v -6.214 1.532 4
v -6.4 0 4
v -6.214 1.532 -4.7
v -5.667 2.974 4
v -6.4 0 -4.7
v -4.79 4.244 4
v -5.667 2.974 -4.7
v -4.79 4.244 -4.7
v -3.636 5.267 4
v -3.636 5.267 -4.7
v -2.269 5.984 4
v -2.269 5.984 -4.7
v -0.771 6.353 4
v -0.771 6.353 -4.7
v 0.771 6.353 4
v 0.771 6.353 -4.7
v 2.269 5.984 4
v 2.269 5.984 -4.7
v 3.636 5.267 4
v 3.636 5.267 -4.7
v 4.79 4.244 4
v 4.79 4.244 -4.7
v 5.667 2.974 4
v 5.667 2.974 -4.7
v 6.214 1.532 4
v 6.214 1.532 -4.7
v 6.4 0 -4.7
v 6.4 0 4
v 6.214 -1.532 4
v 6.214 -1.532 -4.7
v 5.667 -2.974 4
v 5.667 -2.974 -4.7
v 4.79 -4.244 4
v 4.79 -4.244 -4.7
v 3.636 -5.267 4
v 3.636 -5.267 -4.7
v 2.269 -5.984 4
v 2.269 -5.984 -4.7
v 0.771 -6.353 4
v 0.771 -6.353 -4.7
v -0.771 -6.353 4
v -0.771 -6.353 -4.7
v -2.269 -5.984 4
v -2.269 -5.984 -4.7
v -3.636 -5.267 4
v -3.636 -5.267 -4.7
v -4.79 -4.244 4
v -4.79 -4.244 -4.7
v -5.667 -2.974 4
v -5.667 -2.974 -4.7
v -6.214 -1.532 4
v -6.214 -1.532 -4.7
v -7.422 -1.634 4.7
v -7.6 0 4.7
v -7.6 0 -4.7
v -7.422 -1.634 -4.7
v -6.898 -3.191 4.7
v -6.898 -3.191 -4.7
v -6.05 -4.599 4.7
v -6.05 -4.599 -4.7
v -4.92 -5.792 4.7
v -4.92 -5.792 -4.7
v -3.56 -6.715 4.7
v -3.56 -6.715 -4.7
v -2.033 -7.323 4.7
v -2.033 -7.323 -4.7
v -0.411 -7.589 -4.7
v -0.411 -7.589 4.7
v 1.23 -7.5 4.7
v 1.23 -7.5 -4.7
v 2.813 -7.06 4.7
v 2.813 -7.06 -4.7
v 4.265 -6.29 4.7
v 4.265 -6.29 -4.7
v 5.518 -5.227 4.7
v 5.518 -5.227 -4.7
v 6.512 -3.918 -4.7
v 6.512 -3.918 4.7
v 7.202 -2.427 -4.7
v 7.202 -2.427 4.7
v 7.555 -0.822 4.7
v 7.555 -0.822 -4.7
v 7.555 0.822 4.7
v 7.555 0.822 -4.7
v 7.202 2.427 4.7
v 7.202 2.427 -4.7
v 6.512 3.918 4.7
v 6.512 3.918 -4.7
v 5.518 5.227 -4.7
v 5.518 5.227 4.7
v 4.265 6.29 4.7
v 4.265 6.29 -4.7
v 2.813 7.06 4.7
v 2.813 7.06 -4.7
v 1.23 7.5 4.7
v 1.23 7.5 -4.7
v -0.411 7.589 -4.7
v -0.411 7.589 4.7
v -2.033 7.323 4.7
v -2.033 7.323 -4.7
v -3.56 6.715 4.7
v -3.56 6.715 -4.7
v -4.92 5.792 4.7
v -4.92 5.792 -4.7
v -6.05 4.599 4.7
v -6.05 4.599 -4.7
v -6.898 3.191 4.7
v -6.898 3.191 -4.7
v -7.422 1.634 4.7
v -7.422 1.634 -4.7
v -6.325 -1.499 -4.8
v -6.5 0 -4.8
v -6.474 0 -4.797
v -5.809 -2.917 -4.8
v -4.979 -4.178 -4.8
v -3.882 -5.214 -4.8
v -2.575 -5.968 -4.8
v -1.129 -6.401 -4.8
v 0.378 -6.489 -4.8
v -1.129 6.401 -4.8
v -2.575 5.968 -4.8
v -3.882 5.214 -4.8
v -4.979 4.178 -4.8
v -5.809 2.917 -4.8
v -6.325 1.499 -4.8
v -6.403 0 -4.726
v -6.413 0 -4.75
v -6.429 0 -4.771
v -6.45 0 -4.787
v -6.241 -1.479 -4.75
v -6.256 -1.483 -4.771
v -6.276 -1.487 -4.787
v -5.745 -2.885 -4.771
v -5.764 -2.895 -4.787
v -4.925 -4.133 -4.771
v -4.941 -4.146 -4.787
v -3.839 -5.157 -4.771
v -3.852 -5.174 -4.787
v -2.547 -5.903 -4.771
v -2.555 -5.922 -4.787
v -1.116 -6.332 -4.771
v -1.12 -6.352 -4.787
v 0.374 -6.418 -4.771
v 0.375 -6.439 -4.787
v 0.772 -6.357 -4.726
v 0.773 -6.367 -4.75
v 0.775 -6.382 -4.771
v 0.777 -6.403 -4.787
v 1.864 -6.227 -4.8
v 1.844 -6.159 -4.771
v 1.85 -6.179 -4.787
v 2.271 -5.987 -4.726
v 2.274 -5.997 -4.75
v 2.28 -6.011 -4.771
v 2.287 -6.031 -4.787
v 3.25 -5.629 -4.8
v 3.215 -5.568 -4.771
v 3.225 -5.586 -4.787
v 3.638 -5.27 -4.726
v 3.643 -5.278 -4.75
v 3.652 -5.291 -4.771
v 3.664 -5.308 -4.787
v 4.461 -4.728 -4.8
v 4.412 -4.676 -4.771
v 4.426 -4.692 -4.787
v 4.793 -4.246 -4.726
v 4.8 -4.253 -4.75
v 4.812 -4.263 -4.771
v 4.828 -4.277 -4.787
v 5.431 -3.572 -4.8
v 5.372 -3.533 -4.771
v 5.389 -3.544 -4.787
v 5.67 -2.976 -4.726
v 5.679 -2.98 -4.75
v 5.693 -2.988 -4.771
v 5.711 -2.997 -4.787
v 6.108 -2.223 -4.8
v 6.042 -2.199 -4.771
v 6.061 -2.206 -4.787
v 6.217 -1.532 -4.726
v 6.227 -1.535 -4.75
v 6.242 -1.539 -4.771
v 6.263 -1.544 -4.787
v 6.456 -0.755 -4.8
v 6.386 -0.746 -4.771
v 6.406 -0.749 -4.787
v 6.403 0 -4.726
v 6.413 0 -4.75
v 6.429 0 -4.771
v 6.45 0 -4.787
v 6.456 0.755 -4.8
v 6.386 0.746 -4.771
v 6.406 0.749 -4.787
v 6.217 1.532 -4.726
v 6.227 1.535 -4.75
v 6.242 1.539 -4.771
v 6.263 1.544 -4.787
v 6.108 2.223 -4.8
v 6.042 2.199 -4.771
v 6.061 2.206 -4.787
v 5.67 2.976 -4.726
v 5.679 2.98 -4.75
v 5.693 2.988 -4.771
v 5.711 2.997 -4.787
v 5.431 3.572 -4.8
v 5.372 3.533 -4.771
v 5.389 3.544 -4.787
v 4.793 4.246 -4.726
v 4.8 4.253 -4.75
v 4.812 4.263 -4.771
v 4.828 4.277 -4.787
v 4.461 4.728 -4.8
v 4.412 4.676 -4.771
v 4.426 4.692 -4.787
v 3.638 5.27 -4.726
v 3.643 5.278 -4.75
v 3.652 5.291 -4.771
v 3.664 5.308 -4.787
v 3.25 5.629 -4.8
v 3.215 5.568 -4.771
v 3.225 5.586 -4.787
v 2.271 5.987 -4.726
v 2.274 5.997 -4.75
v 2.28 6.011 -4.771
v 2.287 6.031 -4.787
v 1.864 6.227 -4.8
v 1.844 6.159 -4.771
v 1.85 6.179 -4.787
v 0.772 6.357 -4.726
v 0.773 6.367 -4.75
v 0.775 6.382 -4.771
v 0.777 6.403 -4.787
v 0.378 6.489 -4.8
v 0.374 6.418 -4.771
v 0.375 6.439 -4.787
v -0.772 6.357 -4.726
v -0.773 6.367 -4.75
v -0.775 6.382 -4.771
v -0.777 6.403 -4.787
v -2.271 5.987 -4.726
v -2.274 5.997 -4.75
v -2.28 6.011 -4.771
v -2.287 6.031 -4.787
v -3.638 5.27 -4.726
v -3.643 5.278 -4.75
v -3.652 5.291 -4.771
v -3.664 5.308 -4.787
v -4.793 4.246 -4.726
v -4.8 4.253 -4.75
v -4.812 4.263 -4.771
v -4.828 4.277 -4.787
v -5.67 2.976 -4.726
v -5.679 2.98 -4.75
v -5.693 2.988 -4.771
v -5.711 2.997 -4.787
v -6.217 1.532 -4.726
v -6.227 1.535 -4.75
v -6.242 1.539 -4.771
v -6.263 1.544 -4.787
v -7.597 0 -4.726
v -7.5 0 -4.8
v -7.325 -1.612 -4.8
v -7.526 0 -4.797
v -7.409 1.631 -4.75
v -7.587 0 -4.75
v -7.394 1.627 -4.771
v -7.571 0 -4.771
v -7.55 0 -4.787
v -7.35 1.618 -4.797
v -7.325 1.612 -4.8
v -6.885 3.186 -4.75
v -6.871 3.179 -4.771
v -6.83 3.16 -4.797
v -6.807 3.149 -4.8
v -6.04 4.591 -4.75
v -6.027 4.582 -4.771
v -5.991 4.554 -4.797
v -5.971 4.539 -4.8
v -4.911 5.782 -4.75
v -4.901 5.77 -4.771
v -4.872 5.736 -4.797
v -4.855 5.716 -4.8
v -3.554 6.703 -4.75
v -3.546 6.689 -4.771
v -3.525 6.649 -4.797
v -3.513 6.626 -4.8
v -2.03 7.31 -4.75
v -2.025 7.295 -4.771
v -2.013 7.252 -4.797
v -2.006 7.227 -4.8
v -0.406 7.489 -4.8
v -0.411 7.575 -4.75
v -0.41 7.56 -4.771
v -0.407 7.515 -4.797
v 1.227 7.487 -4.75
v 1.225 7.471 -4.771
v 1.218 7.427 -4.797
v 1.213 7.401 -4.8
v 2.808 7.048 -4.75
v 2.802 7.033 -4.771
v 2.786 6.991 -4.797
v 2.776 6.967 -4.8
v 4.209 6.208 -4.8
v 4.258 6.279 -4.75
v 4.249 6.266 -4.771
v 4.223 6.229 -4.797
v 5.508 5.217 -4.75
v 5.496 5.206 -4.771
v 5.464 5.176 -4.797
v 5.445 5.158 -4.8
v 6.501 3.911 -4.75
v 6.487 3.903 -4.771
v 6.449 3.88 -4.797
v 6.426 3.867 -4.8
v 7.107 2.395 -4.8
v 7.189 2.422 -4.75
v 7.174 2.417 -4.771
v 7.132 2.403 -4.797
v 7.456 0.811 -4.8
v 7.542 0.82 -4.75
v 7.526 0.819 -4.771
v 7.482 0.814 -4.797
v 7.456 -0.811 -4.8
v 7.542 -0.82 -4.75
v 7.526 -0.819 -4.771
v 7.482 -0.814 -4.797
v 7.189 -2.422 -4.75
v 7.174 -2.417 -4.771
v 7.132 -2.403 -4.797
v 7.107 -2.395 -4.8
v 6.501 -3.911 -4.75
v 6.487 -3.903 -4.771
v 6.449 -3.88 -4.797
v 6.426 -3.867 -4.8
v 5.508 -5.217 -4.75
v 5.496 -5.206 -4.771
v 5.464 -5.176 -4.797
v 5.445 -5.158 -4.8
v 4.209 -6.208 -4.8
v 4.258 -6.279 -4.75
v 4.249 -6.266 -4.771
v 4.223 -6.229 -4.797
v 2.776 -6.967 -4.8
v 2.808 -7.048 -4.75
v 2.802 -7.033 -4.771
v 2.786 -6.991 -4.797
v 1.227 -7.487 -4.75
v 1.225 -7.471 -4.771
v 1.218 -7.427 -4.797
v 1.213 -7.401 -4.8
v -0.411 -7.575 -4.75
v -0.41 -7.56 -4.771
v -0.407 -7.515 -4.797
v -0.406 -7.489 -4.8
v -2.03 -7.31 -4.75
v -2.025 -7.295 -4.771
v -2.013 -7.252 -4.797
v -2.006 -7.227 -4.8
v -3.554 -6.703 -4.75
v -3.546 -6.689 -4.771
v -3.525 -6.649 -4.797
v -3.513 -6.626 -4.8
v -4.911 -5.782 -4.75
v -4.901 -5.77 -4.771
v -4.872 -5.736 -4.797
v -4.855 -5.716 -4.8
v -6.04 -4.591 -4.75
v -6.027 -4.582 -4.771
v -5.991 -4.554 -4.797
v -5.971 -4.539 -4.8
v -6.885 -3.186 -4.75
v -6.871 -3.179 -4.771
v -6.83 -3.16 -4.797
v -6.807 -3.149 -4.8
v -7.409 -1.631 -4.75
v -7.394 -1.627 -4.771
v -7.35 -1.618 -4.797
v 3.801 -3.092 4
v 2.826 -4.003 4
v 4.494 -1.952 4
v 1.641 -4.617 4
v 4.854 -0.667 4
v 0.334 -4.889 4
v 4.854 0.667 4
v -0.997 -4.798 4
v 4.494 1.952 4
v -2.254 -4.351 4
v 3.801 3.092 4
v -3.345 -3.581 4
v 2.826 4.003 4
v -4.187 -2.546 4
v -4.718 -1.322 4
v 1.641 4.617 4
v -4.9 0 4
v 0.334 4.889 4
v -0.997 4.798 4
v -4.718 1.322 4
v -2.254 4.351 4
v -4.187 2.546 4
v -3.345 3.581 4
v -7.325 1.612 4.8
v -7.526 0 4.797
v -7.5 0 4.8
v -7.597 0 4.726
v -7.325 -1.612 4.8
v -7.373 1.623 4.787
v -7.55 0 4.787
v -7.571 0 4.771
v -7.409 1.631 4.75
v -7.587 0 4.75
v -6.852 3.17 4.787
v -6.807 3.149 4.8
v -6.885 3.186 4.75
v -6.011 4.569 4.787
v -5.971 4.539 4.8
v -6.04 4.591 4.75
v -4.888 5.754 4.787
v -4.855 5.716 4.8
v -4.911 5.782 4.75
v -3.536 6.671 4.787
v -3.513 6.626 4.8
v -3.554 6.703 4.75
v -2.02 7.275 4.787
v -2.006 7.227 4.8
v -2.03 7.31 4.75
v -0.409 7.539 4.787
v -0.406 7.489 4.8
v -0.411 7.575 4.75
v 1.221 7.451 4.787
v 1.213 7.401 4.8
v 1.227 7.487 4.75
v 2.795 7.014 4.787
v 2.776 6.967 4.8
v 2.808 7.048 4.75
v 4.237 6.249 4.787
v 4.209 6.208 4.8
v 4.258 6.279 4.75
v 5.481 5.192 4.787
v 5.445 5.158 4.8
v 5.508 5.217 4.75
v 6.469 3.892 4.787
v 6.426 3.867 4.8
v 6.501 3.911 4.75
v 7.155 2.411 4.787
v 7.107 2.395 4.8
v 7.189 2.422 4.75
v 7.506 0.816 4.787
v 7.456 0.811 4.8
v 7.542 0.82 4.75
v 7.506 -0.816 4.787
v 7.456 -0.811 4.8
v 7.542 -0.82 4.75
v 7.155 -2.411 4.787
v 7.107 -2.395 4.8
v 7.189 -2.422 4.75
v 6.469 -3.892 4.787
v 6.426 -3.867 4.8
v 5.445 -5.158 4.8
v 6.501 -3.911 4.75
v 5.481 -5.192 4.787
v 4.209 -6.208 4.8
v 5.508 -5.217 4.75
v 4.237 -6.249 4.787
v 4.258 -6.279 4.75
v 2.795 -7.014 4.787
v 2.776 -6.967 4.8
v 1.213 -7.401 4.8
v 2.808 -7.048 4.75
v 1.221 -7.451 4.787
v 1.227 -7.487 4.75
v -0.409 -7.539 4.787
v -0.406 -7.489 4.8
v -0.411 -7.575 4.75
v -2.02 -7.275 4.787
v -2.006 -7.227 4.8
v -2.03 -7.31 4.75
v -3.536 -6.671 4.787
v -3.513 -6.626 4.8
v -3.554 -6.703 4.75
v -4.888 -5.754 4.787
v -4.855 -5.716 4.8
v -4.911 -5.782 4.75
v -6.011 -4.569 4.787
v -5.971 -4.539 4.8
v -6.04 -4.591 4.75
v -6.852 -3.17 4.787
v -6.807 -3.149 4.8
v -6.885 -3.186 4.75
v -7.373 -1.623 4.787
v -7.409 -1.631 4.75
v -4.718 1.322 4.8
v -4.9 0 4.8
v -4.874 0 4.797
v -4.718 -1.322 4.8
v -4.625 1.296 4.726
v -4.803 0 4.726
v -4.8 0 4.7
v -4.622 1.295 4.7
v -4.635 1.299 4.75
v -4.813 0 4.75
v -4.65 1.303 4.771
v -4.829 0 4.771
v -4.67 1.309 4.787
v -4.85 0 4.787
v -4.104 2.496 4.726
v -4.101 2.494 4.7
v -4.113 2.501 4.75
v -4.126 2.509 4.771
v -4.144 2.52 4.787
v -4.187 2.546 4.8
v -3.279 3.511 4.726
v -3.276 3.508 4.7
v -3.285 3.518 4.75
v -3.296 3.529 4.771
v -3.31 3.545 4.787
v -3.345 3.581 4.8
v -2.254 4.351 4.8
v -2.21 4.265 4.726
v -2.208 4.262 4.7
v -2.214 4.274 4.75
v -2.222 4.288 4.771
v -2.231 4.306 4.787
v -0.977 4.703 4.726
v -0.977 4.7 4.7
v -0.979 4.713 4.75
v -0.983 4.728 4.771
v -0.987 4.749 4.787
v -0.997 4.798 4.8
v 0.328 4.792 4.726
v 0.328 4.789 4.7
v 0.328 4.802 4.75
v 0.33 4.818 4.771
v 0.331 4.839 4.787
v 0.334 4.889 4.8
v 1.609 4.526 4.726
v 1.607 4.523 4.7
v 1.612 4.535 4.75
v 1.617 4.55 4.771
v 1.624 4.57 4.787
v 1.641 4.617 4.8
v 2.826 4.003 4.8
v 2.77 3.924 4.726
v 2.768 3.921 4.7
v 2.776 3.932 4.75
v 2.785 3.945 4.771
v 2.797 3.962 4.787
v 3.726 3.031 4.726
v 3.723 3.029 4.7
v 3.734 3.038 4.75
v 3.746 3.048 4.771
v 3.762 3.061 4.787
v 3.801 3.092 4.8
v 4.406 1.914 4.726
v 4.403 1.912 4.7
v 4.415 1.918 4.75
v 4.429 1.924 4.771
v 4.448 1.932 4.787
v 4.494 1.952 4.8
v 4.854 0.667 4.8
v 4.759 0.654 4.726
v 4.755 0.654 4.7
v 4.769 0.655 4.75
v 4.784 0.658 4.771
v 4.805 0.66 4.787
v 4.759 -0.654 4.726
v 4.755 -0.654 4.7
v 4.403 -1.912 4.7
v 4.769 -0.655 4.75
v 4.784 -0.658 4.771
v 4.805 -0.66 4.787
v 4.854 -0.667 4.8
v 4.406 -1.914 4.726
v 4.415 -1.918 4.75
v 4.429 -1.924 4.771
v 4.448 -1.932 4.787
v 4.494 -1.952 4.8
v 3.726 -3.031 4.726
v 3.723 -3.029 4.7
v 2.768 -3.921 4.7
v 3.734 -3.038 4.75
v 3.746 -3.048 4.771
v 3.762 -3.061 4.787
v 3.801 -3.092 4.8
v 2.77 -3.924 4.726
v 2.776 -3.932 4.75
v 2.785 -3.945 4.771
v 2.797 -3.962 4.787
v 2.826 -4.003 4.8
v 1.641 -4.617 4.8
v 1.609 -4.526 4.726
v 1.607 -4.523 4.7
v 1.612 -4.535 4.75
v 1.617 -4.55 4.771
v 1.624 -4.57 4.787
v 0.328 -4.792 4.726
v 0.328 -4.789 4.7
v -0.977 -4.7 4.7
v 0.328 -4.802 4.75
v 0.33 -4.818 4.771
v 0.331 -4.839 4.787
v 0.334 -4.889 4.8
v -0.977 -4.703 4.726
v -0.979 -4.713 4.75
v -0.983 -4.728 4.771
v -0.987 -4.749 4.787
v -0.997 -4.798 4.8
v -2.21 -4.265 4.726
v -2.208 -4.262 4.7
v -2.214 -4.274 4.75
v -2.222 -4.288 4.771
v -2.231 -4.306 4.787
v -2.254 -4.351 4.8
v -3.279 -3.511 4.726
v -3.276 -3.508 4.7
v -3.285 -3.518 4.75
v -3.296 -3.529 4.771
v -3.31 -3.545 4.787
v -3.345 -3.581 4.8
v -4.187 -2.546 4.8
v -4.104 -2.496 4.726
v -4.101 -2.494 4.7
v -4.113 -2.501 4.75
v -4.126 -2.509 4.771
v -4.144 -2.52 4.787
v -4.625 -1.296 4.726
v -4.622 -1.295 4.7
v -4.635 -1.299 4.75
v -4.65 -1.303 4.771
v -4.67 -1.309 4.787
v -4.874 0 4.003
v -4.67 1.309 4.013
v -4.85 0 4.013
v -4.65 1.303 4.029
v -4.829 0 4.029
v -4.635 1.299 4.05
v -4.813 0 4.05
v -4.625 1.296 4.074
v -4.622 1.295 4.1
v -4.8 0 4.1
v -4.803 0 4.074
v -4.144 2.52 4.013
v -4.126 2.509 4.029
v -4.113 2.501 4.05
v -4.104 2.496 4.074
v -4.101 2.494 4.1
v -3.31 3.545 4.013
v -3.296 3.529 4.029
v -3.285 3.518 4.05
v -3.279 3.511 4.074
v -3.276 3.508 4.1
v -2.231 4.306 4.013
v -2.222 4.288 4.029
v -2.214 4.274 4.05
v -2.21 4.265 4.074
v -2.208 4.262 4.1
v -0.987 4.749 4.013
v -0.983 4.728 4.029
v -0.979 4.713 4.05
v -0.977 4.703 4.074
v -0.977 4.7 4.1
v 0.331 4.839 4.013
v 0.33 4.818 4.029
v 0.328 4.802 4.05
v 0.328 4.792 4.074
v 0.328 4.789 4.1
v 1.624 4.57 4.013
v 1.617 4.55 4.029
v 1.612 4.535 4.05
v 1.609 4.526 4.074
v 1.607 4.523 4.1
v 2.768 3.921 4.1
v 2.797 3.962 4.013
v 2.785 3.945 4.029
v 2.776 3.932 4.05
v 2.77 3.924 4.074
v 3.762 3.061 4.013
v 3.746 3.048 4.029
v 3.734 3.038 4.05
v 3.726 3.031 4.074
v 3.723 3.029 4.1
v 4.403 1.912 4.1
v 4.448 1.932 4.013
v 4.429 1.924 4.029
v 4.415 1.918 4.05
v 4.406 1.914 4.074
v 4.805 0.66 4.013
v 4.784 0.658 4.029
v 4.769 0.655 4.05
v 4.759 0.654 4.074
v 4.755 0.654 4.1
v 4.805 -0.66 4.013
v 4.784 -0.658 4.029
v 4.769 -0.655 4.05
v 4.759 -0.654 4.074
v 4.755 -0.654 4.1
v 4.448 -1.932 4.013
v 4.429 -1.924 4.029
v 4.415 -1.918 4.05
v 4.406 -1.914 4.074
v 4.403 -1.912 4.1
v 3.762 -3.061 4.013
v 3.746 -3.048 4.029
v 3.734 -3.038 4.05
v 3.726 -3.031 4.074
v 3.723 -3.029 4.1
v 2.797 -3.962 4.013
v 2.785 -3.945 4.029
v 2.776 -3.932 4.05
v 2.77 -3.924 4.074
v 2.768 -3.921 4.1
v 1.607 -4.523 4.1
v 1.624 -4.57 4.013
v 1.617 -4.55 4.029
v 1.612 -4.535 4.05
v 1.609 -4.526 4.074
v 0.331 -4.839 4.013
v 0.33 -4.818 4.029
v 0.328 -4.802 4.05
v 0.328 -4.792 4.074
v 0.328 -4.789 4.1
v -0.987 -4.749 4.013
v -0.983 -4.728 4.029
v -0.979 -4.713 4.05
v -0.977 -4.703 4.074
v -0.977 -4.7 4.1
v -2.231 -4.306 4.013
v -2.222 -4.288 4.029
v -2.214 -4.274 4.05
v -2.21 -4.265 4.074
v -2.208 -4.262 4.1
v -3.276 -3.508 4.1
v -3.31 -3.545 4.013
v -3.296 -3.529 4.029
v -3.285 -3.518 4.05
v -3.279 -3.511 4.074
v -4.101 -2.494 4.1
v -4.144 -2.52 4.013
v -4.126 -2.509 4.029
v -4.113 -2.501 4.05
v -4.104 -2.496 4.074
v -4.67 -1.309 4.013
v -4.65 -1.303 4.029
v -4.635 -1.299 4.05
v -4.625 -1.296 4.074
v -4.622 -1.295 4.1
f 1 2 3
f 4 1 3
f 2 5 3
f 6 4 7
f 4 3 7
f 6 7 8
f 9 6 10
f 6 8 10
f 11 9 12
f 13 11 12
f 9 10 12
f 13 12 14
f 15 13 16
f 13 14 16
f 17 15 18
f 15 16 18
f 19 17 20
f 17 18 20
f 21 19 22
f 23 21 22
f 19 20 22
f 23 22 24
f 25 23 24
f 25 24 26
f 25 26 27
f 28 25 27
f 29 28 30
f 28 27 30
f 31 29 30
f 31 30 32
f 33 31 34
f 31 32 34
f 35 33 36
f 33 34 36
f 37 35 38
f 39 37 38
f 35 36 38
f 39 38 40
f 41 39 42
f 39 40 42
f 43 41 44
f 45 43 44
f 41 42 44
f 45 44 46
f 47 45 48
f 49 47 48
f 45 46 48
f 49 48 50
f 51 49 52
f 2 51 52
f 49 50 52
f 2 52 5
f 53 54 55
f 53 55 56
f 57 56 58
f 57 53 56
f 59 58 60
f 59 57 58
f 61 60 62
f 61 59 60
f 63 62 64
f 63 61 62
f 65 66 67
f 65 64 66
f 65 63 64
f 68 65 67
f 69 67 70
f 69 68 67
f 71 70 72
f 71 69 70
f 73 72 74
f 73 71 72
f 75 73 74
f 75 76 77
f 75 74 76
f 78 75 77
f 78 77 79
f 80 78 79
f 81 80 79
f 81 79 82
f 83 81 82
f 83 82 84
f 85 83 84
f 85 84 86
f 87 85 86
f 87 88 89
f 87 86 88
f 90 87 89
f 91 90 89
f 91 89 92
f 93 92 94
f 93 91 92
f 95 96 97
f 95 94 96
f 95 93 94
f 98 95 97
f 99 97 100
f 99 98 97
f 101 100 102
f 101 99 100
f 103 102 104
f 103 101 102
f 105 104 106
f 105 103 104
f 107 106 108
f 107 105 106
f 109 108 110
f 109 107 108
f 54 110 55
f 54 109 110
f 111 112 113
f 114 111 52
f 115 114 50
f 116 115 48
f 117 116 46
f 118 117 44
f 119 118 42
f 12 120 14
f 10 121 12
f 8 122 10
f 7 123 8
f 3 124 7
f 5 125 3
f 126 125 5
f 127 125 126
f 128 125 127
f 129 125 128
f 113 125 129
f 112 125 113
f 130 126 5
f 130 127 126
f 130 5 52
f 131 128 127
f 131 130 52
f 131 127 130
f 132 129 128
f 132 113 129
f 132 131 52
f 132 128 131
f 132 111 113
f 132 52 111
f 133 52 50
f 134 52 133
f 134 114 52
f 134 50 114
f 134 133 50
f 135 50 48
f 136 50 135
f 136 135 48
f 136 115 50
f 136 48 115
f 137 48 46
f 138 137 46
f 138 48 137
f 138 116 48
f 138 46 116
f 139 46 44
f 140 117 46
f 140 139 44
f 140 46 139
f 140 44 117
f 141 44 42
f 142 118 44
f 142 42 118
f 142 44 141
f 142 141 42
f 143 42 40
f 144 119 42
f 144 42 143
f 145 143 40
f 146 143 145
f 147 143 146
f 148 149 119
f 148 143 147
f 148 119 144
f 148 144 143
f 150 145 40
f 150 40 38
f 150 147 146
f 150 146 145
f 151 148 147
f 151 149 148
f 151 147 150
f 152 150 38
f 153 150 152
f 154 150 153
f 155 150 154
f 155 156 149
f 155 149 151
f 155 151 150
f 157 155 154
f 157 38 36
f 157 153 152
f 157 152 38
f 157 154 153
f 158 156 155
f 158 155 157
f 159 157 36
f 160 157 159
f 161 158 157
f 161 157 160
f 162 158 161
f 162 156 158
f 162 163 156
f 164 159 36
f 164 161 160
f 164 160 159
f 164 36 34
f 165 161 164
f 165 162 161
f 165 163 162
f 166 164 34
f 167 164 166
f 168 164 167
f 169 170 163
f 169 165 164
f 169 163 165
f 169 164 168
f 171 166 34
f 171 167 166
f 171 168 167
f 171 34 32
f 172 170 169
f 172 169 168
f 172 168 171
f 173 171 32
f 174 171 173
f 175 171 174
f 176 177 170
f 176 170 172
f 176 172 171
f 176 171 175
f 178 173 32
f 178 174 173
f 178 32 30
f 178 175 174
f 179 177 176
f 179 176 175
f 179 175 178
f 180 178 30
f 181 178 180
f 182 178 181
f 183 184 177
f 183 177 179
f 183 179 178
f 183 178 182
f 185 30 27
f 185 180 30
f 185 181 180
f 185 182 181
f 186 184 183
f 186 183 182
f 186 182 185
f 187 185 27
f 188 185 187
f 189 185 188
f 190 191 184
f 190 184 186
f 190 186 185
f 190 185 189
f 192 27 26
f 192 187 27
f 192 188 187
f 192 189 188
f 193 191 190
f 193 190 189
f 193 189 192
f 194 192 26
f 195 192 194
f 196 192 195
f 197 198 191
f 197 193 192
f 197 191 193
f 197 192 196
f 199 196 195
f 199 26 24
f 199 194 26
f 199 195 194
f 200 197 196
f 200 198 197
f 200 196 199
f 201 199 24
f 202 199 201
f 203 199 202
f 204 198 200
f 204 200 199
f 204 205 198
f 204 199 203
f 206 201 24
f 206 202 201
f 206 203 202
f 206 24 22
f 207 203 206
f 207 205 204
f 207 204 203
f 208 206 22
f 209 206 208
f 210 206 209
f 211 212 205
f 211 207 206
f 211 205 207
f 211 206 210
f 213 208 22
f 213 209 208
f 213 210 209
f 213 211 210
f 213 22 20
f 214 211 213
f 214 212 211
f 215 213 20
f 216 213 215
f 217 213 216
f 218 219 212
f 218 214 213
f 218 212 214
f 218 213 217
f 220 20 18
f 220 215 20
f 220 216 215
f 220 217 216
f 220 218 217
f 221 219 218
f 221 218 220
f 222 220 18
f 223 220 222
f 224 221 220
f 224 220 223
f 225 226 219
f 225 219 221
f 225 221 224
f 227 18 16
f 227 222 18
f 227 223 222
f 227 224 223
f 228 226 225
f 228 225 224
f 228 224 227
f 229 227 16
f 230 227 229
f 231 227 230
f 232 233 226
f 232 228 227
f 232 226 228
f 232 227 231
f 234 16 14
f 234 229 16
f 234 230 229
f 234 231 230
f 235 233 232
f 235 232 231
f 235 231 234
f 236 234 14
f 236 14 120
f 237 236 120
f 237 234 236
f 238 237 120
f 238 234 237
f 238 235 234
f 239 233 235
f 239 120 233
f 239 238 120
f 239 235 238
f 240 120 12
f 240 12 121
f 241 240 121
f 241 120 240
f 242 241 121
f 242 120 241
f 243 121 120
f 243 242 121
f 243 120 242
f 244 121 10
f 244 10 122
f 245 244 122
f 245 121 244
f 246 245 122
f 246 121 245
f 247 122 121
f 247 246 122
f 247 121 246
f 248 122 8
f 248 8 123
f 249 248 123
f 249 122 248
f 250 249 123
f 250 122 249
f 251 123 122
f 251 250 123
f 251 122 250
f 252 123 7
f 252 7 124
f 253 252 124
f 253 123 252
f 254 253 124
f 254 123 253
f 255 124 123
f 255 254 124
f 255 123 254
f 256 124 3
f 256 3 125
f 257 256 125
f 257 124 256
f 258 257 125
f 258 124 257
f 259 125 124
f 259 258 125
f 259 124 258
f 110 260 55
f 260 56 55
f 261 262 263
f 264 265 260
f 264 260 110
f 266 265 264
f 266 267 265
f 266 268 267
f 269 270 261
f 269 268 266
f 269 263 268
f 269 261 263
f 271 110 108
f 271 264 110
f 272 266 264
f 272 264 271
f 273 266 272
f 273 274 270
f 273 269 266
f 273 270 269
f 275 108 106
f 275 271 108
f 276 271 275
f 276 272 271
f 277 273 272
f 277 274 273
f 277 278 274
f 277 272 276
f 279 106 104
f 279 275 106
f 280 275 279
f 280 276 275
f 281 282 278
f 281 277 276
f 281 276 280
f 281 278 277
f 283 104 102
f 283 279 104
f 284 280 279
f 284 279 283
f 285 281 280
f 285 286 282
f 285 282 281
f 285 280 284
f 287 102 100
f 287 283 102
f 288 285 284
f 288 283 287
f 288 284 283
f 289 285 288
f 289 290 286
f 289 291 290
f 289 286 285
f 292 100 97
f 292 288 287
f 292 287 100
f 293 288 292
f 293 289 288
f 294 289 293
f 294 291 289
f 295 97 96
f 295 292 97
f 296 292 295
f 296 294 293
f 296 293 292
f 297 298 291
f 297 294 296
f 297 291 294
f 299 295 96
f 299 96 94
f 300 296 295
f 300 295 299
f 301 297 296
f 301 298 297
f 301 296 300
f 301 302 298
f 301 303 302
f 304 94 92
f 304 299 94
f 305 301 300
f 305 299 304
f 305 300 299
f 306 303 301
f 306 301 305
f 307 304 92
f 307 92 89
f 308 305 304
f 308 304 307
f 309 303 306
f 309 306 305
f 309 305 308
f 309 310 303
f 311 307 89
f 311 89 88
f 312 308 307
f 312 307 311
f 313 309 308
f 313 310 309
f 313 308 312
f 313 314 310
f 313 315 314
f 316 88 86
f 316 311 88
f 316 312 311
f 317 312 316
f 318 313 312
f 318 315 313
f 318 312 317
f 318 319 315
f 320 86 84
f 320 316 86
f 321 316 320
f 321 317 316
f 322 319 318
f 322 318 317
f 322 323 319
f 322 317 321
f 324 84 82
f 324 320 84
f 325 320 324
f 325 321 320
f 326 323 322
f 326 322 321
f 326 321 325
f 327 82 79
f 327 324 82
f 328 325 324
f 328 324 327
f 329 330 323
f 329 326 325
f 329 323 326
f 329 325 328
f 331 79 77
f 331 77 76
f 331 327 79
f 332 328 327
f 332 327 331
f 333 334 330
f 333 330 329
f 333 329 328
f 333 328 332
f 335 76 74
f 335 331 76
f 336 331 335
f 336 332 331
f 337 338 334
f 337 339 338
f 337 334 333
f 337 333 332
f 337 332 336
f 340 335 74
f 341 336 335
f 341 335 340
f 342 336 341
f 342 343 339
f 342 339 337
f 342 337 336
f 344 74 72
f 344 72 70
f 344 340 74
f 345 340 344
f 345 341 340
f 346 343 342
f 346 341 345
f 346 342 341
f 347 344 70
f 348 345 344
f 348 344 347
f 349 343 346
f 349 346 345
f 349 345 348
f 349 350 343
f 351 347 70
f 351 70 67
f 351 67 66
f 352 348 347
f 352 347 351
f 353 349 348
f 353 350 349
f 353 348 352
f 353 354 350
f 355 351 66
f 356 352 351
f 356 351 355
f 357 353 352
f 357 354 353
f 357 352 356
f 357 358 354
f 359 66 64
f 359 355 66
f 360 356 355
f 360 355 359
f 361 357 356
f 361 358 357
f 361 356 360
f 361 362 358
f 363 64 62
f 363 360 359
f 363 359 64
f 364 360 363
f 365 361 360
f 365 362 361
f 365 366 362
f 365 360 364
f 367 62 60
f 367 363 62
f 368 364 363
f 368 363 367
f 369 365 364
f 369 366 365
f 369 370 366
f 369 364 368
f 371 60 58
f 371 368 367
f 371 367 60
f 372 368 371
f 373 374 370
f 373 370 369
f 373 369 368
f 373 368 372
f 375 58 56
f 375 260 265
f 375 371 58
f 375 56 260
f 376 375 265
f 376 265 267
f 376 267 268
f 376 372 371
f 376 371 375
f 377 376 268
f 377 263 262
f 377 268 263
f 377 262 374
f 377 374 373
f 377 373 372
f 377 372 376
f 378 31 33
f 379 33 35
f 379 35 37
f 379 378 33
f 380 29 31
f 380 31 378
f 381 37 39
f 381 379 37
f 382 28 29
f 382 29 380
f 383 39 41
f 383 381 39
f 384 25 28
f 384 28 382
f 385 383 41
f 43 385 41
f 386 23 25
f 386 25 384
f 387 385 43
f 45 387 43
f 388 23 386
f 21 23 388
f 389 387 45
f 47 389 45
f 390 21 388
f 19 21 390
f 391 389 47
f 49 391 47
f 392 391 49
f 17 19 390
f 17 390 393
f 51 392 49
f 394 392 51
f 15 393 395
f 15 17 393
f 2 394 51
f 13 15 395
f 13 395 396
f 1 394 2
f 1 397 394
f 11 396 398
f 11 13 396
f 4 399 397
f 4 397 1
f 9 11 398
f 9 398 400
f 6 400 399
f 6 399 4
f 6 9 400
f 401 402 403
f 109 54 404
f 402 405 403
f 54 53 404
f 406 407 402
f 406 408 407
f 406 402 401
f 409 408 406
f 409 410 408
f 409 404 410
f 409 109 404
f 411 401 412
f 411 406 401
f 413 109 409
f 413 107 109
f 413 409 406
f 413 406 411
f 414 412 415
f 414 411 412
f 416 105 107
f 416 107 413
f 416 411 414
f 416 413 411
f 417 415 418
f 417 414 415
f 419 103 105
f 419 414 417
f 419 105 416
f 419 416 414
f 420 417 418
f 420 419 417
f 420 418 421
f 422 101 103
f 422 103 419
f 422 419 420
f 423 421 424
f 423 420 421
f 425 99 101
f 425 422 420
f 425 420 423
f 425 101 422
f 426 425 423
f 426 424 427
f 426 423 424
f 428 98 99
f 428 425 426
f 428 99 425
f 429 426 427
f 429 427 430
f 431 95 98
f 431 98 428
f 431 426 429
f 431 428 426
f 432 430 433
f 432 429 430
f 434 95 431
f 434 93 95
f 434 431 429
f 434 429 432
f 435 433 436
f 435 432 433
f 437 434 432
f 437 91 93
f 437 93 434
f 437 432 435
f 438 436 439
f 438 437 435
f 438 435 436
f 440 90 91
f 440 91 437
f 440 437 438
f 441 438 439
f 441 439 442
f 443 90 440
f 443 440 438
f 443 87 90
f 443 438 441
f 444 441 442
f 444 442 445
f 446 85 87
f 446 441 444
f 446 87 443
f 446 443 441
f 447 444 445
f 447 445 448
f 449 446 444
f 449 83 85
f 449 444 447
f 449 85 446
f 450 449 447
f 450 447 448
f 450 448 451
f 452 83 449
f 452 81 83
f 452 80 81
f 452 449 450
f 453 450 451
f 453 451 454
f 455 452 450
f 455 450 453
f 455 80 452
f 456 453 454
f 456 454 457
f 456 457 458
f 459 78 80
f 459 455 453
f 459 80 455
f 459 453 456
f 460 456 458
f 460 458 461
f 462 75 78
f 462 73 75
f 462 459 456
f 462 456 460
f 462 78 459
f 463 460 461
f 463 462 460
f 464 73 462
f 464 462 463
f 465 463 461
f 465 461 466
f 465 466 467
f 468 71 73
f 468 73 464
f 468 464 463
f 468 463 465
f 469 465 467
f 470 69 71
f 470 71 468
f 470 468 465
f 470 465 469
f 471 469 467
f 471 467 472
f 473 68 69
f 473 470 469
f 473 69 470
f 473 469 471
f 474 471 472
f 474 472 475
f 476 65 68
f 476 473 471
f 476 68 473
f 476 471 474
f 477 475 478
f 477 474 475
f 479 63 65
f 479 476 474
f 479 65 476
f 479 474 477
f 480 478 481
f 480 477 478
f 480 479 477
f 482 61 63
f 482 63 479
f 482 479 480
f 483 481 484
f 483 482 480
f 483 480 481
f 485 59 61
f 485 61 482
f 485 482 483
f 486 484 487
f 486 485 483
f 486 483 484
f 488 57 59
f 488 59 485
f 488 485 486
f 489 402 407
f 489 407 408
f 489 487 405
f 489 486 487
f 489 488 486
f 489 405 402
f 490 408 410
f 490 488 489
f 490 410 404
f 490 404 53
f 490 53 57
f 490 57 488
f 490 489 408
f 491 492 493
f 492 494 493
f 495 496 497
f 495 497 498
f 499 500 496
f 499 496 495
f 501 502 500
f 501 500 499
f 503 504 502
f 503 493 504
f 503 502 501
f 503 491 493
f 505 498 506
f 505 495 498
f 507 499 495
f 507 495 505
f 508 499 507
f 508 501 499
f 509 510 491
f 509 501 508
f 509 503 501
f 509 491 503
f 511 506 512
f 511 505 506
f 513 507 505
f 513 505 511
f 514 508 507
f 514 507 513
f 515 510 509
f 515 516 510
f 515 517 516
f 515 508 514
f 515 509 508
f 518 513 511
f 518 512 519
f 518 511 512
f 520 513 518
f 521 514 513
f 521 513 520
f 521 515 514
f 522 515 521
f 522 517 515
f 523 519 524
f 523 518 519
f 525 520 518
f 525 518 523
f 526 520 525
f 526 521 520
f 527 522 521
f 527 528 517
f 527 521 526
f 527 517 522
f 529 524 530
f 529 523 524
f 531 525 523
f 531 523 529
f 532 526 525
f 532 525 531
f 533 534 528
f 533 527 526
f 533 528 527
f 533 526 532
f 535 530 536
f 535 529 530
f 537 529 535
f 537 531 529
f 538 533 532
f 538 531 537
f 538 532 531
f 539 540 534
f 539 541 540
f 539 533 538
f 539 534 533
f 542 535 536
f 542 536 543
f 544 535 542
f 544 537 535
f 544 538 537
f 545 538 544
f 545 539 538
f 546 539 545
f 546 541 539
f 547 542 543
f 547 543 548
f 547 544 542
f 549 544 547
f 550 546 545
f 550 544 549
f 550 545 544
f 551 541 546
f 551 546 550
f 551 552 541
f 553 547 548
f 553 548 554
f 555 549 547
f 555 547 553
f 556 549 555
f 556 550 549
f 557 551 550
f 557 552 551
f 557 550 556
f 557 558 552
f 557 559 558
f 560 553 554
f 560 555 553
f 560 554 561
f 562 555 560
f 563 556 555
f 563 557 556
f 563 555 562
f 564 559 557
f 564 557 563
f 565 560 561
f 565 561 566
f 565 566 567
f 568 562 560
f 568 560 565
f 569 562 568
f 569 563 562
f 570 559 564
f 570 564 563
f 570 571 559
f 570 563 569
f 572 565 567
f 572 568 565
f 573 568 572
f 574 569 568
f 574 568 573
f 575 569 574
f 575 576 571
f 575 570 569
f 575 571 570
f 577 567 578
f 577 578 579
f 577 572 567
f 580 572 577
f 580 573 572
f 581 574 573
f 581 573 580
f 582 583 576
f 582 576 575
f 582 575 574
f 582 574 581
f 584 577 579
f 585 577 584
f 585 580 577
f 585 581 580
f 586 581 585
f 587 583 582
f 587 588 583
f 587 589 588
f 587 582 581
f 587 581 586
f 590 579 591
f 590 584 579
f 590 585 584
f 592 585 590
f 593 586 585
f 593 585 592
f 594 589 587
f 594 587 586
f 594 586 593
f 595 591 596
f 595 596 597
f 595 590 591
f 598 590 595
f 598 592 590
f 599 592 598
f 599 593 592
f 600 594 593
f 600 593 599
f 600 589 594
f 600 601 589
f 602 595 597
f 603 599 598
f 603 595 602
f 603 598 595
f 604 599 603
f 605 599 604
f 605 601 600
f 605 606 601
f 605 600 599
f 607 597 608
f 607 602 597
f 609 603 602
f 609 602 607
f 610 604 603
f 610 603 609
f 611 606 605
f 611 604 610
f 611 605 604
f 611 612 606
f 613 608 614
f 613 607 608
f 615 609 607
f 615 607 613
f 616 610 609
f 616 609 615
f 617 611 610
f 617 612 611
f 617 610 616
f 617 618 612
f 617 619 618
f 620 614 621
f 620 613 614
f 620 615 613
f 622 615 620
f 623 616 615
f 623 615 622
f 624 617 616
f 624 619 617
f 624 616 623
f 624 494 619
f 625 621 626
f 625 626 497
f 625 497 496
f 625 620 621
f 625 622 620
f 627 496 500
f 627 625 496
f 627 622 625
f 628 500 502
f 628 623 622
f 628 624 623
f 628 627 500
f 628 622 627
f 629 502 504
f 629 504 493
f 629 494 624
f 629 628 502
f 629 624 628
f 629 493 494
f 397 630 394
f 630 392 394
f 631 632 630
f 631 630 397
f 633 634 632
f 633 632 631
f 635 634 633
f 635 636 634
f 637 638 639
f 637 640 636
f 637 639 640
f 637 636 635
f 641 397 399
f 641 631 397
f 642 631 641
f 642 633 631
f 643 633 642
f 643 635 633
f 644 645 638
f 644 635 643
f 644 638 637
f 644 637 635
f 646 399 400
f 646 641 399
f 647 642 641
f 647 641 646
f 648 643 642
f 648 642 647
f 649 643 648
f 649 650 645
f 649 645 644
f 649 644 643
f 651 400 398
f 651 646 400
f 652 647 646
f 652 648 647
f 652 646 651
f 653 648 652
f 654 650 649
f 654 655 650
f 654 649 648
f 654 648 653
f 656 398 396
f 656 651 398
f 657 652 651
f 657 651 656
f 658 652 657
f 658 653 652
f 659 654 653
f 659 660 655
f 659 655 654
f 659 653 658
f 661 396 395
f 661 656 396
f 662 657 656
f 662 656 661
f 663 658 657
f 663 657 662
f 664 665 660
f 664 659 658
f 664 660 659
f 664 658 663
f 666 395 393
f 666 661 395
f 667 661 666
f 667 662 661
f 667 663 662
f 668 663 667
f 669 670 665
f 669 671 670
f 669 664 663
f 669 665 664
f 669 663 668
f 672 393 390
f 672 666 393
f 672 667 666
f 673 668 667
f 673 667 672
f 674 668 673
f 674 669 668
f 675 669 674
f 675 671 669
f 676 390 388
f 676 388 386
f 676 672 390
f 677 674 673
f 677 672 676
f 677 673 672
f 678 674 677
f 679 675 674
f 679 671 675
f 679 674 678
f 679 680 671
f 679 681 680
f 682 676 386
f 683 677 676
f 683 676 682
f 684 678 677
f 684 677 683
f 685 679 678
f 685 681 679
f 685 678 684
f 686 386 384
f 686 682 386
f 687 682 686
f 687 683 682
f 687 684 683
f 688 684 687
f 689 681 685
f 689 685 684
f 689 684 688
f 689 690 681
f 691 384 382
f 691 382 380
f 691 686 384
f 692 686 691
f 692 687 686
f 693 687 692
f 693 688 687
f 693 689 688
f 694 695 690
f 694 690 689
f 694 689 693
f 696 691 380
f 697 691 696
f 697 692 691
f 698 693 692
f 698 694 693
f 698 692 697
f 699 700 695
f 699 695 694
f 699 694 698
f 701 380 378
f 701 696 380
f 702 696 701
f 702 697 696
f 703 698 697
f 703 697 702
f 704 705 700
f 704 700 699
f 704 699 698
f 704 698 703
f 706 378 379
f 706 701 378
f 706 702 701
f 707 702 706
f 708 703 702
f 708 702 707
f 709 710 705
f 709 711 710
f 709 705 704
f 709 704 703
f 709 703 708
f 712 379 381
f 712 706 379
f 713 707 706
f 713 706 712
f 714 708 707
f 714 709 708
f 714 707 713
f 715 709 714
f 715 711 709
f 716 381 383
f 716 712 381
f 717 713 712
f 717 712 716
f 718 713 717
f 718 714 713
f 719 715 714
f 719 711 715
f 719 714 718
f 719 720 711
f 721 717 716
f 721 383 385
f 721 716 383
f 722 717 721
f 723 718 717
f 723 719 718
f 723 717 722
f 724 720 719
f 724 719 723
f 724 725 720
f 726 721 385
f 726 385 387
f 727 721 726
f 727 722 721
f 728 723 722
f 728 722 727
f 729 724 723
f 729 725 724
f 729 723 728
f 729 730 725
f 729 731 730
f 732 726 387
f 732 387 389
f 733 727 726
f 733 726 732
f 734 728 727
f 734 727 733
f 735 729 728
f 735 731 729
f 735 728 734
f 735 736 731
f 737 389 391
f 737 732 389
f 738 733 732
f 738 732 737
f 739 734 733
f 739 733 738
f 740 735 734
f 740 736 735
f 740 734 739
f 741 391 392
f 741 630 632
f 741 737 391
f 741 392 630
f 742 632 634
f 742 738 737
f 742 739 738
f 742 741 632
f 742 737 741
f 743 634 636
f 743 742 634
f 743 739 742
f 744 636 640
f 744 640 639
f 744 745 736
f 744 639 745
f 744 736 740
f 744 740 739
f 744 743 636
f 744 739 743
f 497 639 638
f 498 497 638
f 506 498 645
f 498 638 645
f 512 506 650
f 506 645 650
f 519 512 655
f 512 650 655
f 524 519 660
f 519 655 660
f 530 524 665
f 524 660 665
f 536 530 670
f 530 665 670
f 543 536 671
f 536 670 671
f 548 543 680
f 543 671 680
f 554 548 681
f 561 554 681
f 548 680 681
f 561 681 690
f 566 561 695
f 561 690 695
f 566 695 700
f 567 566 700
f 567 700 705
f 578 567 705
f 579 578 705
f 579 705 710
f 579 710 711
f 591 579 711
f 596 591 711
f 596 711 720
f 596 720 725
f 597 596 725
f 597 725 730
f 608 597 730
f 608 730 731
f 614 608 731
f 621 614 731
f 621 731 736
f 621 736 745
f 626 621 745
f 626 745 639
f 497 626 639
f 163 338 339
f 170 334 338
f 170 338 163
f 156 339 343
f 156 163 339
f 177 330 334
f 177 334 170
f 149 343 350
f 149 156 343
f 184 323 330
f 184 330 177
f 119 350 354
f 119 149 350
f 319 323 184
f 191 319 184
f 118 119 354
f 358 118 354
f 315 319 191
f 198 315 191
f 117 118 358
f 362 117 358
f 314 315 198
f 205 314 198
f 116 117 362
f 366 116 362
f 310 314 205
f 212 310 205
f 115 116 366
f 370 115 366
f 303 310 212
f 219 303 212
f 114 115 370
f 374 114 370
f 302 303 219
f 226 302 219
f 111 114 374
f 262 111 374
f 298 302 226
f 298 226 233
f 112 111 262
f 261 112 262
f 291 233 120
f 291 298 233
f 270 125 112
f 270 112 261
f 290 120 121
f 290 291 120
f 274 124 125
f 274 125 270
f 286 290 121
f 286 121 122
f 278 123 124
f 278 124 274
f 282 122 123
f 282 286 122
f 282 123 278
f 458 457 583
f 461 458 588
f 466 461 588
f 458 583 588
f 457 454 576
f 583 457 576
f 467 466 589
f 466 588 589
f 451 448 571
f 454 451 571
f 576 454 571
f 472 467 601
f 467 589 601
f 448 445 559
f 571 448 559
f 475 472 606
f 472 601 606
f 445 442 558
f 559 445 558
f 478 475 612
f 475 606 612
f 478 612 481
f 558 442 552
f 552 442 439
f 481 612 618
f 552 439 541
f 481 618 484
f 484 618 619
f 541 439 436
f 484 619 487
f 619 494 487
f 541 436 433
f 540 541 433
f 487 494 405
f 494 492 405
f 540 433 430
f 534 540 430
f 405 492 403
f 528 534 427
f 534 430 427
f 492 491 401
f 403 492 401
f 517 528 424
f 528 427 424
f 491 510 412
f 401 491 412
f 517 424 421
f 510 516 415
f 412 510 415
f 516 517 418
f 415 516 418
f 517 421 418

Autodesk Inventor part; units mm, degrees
ref_plane "YZ Plane" through (0, 0, 0) normal (1, 0, 0) x (0, 1, 0)
ref_plane "XZ Plane" through (0, 0, 0) normal (0, 1, 0) x (-1, 0, 0)
ref_plane "XY Plane" through (0, 0, 0) normal (0, 0, 1) x (1, 0, 0)
sketch "Sketch2" plane through (0, 0, 0) normal (0, 1, 0) x (-1, 0, 0)
  line L0 (6.4, -4.8) -> (7.6, -4.8)
  line L1 (7.6, -4.8) -> (7.6, 4.8)
  line L2 (7.6, 4.8) -> (4.8, 4.8)
  line L3 (4.8, 4.8) -> (4.8, 4)
  line L4 (4.8, 4) -> (6.4, 4)
  line L5 (6.4, 4) -> (6.4, -4.8)
  line L6 (0, 4.8) -> (0, -4.8)
  point P0 (0, 0)
  point P1 (0, 0)
  dimension "d0" = 15.2
  dimension "d1" = 9.6
  dimension "d2" = 0.8
  dimension "d3" = 9.6
  dimension "d4" = 12.8
revolve "Revolution1" add sketch "Sketch2" angle 360 about axis through (0, 0, 4.8) along (0, 0, -1)
fillet "Fillet1" radius 0.1 5 edges at (4.8, 0, 4.8) (4.8, 0, 4) (7.6, 0, 4.8) (7.6, 0, -4.8) (6.4, 0, -4.8)
equation "\"d1\" = lh"
equation "\"d3\" = lh"
equation "\"lh\" = 9.6"
properties part number "99401-RedRubber" material "Rubber"
